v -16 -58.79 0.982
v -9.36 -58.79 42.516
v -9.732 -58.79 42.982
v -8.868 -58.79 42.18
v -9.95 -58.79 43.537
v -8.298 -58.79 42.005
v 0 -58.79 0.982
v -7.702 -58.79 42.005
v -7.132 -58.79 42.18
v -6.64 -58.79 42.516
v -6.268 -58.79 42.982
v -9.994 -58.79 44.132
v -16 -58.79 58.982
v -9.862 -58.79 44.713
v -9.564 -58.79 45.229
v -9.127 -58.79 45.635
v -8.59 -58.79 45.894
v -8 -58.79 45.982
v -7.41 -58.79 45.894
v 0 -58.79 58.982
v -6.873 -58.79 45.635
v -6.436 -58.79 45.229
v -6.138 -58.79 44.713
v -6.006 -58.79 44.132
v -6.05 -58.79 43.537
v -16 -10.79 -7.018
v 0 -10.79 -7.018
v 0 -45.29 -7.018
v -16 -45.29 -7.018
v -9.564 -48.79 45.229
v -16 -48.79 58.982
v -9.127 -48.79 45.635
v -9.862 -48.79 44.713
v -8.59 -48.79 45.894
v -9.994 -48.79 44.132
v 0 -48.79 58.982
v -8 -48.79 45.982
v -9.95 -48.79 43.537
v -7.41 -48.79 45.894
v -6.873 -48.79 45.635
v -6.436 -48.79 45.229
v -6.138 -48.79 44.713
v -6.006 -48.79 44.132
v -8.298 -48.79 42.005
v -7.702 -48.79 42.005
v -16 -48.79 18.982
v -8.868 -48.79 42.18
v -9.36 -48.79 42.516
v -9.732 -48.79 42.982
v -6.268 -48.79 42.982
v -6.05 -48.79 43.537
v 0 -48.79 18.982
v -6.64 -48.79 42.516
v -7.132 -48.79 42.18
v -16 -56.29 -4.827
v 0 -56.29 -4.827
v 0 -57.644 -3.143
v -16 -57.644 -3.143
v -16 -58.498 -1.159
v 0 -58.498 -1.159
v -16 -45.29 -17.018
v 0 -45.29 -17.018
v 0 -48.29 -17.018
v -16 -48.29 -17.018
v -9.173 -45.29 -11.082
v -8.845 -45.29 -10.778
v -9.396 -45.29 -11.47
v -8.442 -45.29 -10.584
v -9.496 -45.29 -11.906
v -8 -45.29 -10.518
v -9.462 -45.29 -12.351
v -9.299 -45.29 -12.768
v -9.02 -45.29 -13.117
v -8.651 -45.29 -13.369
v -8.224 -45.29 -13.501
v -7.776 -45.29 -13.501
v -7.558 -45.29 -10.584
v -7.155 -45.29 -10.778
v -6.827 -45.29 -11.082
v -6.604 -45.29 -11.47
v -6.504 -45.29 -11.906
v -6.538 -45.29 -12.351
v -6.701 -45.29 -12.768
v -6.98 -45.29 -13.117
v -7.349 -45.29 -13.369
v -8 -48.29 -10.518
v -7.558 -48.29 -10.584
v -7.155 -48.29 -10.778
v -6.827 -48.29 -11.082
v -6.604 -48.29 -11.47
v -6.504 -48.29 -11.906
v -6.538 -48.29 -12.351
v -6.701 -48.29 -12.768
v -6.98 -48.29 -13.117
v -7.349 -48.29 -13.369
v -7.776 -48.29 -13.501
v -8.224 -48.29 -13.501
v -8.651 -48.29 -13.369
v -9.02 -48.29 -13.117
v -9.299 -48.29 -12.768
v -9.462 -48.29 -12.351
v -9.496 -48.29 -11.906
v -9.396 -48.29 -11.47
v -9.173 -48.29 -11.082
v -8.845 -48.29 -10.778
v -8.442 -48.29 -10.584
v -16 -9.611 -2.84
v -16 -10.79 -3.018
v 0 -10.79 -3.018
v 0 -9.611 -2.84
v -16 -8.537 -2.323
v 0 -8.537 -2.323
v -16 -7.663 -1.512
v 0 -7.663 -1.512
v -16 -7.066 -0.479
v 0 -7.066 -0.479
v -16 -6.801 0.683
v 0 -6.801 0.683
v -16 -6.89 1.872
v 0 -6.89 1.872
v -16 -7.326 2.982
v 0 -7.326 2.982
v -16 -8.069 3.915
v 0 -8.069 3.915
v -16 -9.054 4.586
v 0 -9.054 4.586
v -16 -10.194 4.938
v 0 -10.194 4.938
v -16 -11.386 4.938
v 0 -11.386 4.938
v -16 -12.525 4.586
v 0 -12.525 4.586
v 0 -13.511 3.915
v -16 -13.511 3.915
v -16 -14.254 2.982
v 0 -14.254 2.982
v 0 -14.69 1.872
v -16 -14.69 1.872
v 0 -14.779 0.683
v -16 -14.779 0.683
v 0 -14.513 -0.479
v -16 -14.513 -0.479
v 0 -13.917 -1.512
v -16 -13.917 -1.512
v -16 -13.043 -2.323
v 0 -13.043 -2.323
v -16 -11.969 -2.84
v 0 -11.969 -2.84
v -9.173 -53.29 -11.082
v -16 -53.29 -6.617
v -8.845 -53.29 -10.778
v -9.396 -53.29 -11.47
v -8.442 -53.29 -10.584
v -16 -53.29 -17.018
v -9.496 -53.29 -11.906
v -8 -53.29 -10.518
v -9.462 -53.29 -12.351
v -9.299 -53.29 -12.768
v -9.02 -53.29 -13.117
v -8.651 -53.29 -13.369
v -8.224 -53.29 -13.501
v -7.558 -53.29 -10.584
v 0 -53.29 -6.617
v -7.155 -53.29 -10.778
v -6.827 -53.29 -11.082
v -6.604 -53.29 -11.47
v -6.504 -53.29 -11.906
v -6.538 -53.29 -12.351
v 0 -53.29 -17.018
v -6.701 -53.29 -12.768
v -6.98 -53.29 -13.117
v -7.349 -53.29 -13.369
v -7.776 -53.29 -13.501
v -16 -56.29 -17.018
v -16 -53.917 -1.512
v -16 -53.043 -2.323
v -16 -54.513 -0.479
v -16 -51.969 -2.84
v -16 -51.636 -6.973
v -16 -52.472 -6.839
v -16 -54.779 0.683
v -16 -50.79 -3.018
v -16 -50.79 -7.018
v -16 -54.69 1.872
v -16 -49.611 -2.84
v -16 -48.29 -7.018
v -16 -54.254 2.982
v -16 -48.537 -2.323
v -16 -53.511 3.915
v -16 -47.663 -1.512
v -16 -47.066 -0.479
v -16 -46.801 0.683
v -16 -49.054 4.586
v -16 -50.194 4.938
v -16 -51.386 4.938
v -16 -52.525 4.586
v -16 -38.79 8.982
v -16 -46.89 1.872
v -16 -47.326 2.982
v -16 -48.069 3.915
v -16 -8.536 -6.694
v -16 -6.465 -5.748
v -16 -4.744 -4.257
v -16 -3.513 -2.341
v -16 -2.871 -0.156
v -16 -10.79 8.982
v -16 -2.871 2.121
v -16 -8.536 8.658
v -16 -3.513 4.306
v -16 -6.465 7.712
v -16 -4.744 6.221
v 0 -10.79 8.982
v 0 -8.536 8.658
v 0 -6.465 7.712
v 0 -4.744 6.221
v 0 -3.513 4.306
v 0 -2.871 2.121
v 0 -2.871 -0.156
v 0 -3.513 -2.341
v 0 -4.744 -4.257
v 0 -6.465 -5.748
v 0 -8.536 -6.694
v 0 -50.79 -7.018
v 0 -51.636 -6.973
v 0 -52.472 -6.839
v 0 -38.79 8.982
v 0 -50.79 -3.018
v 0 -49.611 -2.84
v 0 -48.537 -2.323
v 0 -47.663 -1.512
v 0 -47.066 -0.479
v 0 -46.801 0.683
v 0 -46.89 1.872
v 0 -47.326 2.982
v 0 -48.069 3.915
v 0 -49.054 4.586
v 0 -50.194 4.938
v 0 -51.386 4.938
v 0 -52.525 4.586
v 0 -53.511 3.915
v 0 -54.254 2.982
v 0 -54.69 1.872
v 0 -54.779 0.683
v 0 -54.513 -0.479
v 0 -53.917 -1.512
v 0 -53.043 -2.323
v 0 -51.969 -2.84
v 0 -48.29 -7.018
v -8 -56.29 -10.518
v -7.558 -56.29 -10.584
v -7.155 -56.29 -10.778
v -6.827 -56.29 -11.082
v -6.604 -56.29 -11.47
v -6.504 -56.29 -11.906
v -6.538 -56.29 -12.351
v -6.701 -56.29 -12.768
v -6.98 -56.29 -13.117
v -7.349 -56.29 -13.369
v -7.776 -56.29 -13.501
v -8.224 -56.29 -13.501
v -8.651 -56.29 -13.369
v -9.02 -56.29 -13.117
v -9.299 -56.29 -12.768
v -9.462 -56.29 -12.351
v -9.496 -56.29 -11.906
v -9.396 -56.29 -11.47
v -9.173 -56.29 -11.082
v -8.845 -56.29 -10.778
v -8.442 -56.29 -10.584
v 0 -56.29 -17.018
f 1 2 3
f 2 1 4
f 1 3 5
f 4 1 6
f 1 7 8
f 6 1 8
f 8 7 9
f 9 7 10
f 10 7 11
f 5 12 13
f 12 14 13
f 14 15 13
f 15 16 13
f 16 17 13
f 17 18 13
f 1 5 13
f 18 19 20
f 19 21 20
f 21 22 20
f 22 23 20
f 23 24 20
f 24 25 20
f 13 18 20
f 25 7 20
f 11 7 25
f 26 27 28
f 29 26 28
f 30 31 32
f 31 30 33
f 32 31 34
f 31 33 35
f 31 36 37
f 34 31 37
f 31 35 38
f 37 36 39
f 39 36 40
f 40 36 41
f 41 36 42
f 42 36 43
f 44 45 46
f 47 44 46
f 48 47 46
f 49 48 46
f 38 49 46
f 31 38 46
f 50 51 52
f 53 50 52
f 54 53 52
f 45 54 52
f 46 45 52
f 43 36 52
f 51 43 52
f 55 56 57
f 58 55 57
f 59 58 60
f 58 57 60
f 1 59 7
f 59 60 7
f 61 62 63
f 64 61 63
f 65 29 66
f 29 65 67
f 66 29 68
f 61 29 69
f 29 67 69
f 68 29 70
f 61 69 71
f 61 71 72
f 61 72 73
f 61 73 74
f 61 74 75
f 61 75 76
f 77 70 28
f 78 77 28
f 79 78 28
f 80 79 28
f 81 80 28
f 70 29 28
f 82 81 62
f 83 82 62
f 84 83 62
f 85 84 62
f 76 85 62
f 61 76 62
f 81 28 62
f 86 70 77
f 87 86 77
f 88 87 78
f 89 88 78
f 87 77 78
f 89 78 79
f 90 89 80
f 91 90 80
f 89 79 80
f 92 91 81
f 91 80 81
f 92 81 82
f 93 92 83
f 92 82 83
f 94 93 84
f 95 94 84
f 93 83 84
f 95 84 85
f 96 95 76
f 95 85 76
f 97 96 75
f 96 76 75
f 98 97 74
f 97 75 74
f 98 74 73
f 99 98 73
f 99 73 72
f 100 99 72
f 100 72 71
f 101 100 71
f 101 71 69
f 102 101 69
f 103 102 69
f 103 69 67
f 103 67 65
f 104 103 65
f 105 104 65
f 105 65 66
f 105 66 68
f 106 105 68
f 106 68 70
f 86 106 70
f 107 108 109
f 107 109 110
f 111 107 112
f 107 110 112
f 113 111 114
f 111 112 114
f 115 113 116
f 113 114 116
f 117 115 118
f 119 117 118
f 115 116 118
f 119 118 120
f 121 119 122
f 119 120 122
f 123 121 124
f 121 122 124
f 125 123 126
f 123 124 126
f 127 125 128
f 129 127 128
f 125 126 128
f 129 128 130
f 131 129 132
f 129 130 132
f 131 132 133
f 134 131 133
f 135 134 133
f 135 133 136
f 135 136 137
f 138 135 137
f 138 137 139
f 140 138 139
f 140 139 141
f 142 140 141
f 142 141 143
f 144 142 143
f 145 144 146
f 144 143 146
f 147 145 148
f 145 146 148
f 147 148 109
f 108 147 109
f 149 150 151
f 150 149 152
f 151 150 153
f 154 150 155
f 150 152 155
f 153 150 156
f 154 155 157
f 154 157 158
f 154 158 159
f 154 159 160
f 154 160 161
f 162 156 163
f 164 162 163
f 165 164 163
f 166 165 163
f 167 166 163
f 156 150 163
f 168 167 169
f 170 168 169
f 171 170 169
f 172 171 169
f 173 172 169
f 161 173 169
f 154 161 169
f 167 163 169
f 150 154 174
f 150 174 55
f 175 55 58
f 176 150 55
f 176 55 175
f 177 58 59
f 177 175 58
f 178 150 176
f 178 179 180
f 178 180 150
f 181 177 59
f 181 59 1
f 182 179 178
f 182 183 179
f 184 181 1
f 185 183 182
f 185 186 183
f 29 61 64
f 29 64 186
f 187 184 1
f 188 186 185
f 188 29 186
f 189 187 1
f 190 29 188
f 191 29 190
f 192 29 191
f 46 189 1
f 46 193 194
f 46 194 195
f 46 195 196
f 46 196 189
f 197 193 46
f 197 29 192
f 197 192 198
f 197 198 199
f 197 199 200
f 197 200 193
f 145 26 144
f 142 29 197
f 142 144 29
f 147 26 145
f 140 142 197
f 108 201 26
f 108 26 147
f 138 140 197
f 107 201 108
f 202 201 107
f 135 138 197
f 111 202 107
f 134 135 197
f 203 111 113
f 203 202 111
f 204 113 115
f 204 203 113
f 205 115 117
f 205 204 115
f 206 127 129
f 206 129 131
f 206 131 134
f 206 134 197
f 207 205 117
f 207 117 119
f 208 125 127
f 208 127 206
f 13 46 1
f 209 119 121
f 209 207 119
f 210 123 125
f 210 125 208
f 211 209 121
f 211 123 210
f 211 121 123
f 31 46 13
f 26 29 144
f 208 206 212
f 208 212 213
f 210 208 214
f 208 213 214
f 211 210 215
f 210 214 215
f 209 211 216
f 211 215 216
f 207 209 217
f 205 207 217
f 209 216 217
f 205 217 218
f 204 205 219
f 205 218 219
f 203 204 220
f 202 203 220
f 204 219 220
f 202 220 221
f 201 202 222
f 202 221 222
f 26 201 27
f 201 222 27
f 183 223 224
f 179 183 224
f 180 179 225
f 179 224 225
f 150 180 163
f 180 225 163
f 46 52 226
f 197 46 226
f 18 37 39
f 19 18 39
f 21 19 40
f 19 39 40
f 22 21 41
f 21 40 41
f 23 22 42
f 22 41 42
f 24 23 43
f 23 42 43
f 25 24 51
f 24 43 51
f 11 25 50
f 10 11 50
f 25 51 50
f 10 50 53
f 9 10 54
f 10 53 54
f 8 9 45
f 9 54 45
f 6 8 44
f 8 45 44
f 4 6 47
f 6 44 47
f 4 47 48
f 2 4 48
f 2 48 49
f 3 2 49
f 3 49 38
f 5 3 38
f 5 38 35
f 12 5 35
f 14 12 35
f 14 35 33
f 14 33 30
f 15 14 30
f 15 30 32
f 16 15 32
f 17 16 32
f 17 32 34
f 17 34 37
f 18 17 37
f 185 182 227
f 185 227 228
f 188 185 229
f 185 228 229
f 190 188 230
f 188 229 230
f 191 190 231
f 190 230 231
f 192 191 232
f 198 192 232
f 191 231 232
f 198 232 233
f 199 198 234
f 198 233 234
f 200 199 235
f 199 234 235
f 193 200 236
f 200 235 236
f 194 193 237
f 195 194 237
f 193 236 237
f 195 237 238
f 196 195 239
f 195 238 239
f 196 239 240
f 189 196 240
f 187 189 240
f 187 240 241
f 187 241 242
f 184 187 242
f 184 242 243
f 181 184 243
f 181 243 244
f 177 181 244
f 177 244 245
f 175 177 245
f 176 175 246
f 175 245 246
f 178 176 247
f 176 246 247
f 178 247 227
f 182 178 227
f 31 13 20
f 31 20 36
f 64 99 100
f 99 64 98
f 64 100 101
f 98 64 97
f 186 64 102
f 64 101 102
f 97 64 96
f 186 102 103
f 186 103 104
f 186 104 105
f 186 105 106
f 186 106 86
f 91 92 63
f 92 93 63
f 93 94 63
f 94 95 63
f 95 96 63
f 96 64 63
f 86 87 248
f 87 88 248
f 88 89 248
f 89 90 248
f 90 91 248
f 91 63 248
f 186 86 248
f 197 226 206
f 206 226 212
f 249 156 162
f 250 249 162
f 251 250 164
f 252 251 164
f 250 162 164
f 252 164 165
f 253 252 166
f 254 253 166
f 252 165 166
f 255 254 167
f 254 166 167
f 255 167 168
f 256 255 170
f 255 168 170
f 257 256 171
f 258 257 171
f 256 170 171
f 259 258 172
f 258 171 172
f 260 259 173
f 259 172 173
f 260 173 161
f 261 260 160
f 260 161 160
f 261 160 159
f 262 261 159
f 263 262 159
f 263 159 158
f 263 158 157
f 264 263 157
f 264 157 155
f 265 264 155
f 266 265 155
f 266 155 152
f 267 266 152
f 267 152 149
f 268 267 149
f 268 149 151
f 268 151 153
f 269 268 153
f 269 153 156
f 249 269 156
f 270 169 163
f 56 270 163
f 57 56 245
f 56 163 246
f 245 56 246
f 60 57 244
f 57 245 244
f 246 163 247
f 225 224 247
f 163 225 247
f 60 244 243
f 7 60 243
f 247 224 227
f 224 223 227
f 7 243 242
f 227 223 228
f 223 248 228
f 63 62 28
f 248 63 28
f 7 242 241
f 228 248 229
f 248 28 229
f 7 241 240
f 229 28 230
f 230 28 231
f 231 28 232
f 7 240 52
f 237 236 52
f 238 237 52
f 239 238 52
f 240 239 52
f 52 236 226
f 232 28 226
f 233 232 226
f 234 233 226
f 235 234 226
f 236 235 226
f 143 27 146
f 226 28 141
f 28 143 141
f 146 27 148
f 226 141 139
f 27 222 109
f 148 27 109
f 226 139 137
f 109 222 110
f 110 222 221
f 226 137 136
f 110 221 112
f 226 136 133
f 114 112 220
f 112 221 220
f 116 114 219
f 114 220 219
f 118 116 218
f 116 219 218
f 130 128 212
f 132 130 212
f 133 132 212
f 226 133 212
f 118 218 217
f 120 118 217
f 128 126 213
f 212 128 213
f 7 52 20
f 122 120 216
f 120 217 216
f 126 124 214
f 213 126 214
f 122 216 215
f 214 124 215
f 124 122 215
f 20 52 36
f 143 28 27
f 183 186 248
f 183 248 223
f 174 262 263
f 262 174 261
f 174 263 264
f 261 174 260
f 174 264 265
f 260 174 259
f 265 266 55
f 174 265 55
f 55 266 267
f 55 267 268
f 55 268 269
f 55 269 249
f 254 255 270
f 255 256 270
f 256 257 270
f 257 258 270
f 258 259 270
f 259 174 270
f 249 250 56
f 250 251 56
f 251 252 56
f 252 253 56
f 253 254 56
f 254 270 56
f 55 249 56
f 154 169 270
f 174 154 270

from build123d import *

# Parameters (mm, degrees)
SKETCH1_R           = 4
BOSS_EXTRUDE1_DEPTH = 16
SKETCH2_R           = 2
CUT_EXTRUDE1_DEPTH  = 77.491311533
SKETCH3_R           = 1.5
CUT_EXTRUDE2_DEPTH  = 75.439040429


with BuildPart() as part:
    # Sketch1 → Boss-Extrude1 (new body)
    with BuildSketch(Plane(origin=(0, 0, 0), x_dir=(0, 0, -1), z_dir=(1, 0, 0))):
        with BuildLine():
            Line((-10.309088451, -58.789851982), (-58.982376521, -58.789851982))
            Line((-58.982376521, -58.789851982), (-58.982376521, -48.789851982))
            Line((-58.982376521, -48.789851982), (-18.982376521, -48.789851982))
            Line((-18.982376521, -48.789851982), (-8.982376521, -38.789851982))
            Line((-8.982376521, -38.789851982), (-8.982376521, -10.789851982))
            ThreePointArc((-8.982376521, -10.789851982), (-0.982376521, -2.789851982), (7.017623479, -10.789851982))
            Line((7.017623479, -10.789851982), (7.017623479, -45.289851982))
            Line((7.017623479, -45.289851982), (17.017623479, -45.289851982))
            Line((17.017623479, -45.289851982), (17.017623479, -48.289851982))
            Line((17.017623479, -48.289851982), (7.017623479, -48.289851982))
            Line((7.017623479, -48.289851982), (7.017623479, -50.789851982))
            ThreePointArc((7.017623479, -50.789851982), (6.916823965, -52.055802887), (6.616965556, -53.289851982))
            Line((6.616965556, -53.289851982), (17.017623479, -53.289851982))
            Line((17.017623479, -53.289851982), (17.017623479, -56.289851982))
            Line((17.017623479, -56.289851982), (4.827098499, -56.289851982))
            ThreePointArc((4.827098499, -56.289851982), (2.179901139, -58.138321211), (-0.982376521, -58.789851982))
            Line((-0.982376521, -58.789851982), (-10.309088451, -58.789851982))
        make_face()
        with Locations((-0.982376521, -10.789851982)):
            Circle(SKETCH1_R, mode=Mode.SUBTRACT)
        with Locations((-0.982376521, -50.789851982)):
            Circle(SKETCH1_R, mode=Mode.SUBTRACT)
    extrude(amount=-BOSS_EXTRUDE1_DEPTH)

    # Sketch2 → Cut-Extrude1 (cut, through all)
    with BuildSketch(Plane(origin=(0, -48.789851982, 0), x_dir=(1, 0, 0), z_dir=(0, 1, 0))):
        with Locations(Location((-8, -43.982376521, 0), (0, 0, 270))):
            Circle(SKETCH2_R)
    extrude(amount=-CUT_EXTRUDE1_DEPTH, mode=Mode.SUBTRACT)

    # Sketch3 → Cut-Extrude2 (cut, through all)
    with BuildSketch(Plane(origin=(0, -45.289851982, 0), x_dir=(1, 0, 0), z_dir=(0, 1, 0))):
        with Locations(Location((-8, 12.017623479, 0), (0, 0, 270))):
            Circle(SKETCH3_R)
    extrude(amount=-CUT_EXTRUDE2_DEPTH, mode=Mode.SUBTRACT)


solid = part.part
